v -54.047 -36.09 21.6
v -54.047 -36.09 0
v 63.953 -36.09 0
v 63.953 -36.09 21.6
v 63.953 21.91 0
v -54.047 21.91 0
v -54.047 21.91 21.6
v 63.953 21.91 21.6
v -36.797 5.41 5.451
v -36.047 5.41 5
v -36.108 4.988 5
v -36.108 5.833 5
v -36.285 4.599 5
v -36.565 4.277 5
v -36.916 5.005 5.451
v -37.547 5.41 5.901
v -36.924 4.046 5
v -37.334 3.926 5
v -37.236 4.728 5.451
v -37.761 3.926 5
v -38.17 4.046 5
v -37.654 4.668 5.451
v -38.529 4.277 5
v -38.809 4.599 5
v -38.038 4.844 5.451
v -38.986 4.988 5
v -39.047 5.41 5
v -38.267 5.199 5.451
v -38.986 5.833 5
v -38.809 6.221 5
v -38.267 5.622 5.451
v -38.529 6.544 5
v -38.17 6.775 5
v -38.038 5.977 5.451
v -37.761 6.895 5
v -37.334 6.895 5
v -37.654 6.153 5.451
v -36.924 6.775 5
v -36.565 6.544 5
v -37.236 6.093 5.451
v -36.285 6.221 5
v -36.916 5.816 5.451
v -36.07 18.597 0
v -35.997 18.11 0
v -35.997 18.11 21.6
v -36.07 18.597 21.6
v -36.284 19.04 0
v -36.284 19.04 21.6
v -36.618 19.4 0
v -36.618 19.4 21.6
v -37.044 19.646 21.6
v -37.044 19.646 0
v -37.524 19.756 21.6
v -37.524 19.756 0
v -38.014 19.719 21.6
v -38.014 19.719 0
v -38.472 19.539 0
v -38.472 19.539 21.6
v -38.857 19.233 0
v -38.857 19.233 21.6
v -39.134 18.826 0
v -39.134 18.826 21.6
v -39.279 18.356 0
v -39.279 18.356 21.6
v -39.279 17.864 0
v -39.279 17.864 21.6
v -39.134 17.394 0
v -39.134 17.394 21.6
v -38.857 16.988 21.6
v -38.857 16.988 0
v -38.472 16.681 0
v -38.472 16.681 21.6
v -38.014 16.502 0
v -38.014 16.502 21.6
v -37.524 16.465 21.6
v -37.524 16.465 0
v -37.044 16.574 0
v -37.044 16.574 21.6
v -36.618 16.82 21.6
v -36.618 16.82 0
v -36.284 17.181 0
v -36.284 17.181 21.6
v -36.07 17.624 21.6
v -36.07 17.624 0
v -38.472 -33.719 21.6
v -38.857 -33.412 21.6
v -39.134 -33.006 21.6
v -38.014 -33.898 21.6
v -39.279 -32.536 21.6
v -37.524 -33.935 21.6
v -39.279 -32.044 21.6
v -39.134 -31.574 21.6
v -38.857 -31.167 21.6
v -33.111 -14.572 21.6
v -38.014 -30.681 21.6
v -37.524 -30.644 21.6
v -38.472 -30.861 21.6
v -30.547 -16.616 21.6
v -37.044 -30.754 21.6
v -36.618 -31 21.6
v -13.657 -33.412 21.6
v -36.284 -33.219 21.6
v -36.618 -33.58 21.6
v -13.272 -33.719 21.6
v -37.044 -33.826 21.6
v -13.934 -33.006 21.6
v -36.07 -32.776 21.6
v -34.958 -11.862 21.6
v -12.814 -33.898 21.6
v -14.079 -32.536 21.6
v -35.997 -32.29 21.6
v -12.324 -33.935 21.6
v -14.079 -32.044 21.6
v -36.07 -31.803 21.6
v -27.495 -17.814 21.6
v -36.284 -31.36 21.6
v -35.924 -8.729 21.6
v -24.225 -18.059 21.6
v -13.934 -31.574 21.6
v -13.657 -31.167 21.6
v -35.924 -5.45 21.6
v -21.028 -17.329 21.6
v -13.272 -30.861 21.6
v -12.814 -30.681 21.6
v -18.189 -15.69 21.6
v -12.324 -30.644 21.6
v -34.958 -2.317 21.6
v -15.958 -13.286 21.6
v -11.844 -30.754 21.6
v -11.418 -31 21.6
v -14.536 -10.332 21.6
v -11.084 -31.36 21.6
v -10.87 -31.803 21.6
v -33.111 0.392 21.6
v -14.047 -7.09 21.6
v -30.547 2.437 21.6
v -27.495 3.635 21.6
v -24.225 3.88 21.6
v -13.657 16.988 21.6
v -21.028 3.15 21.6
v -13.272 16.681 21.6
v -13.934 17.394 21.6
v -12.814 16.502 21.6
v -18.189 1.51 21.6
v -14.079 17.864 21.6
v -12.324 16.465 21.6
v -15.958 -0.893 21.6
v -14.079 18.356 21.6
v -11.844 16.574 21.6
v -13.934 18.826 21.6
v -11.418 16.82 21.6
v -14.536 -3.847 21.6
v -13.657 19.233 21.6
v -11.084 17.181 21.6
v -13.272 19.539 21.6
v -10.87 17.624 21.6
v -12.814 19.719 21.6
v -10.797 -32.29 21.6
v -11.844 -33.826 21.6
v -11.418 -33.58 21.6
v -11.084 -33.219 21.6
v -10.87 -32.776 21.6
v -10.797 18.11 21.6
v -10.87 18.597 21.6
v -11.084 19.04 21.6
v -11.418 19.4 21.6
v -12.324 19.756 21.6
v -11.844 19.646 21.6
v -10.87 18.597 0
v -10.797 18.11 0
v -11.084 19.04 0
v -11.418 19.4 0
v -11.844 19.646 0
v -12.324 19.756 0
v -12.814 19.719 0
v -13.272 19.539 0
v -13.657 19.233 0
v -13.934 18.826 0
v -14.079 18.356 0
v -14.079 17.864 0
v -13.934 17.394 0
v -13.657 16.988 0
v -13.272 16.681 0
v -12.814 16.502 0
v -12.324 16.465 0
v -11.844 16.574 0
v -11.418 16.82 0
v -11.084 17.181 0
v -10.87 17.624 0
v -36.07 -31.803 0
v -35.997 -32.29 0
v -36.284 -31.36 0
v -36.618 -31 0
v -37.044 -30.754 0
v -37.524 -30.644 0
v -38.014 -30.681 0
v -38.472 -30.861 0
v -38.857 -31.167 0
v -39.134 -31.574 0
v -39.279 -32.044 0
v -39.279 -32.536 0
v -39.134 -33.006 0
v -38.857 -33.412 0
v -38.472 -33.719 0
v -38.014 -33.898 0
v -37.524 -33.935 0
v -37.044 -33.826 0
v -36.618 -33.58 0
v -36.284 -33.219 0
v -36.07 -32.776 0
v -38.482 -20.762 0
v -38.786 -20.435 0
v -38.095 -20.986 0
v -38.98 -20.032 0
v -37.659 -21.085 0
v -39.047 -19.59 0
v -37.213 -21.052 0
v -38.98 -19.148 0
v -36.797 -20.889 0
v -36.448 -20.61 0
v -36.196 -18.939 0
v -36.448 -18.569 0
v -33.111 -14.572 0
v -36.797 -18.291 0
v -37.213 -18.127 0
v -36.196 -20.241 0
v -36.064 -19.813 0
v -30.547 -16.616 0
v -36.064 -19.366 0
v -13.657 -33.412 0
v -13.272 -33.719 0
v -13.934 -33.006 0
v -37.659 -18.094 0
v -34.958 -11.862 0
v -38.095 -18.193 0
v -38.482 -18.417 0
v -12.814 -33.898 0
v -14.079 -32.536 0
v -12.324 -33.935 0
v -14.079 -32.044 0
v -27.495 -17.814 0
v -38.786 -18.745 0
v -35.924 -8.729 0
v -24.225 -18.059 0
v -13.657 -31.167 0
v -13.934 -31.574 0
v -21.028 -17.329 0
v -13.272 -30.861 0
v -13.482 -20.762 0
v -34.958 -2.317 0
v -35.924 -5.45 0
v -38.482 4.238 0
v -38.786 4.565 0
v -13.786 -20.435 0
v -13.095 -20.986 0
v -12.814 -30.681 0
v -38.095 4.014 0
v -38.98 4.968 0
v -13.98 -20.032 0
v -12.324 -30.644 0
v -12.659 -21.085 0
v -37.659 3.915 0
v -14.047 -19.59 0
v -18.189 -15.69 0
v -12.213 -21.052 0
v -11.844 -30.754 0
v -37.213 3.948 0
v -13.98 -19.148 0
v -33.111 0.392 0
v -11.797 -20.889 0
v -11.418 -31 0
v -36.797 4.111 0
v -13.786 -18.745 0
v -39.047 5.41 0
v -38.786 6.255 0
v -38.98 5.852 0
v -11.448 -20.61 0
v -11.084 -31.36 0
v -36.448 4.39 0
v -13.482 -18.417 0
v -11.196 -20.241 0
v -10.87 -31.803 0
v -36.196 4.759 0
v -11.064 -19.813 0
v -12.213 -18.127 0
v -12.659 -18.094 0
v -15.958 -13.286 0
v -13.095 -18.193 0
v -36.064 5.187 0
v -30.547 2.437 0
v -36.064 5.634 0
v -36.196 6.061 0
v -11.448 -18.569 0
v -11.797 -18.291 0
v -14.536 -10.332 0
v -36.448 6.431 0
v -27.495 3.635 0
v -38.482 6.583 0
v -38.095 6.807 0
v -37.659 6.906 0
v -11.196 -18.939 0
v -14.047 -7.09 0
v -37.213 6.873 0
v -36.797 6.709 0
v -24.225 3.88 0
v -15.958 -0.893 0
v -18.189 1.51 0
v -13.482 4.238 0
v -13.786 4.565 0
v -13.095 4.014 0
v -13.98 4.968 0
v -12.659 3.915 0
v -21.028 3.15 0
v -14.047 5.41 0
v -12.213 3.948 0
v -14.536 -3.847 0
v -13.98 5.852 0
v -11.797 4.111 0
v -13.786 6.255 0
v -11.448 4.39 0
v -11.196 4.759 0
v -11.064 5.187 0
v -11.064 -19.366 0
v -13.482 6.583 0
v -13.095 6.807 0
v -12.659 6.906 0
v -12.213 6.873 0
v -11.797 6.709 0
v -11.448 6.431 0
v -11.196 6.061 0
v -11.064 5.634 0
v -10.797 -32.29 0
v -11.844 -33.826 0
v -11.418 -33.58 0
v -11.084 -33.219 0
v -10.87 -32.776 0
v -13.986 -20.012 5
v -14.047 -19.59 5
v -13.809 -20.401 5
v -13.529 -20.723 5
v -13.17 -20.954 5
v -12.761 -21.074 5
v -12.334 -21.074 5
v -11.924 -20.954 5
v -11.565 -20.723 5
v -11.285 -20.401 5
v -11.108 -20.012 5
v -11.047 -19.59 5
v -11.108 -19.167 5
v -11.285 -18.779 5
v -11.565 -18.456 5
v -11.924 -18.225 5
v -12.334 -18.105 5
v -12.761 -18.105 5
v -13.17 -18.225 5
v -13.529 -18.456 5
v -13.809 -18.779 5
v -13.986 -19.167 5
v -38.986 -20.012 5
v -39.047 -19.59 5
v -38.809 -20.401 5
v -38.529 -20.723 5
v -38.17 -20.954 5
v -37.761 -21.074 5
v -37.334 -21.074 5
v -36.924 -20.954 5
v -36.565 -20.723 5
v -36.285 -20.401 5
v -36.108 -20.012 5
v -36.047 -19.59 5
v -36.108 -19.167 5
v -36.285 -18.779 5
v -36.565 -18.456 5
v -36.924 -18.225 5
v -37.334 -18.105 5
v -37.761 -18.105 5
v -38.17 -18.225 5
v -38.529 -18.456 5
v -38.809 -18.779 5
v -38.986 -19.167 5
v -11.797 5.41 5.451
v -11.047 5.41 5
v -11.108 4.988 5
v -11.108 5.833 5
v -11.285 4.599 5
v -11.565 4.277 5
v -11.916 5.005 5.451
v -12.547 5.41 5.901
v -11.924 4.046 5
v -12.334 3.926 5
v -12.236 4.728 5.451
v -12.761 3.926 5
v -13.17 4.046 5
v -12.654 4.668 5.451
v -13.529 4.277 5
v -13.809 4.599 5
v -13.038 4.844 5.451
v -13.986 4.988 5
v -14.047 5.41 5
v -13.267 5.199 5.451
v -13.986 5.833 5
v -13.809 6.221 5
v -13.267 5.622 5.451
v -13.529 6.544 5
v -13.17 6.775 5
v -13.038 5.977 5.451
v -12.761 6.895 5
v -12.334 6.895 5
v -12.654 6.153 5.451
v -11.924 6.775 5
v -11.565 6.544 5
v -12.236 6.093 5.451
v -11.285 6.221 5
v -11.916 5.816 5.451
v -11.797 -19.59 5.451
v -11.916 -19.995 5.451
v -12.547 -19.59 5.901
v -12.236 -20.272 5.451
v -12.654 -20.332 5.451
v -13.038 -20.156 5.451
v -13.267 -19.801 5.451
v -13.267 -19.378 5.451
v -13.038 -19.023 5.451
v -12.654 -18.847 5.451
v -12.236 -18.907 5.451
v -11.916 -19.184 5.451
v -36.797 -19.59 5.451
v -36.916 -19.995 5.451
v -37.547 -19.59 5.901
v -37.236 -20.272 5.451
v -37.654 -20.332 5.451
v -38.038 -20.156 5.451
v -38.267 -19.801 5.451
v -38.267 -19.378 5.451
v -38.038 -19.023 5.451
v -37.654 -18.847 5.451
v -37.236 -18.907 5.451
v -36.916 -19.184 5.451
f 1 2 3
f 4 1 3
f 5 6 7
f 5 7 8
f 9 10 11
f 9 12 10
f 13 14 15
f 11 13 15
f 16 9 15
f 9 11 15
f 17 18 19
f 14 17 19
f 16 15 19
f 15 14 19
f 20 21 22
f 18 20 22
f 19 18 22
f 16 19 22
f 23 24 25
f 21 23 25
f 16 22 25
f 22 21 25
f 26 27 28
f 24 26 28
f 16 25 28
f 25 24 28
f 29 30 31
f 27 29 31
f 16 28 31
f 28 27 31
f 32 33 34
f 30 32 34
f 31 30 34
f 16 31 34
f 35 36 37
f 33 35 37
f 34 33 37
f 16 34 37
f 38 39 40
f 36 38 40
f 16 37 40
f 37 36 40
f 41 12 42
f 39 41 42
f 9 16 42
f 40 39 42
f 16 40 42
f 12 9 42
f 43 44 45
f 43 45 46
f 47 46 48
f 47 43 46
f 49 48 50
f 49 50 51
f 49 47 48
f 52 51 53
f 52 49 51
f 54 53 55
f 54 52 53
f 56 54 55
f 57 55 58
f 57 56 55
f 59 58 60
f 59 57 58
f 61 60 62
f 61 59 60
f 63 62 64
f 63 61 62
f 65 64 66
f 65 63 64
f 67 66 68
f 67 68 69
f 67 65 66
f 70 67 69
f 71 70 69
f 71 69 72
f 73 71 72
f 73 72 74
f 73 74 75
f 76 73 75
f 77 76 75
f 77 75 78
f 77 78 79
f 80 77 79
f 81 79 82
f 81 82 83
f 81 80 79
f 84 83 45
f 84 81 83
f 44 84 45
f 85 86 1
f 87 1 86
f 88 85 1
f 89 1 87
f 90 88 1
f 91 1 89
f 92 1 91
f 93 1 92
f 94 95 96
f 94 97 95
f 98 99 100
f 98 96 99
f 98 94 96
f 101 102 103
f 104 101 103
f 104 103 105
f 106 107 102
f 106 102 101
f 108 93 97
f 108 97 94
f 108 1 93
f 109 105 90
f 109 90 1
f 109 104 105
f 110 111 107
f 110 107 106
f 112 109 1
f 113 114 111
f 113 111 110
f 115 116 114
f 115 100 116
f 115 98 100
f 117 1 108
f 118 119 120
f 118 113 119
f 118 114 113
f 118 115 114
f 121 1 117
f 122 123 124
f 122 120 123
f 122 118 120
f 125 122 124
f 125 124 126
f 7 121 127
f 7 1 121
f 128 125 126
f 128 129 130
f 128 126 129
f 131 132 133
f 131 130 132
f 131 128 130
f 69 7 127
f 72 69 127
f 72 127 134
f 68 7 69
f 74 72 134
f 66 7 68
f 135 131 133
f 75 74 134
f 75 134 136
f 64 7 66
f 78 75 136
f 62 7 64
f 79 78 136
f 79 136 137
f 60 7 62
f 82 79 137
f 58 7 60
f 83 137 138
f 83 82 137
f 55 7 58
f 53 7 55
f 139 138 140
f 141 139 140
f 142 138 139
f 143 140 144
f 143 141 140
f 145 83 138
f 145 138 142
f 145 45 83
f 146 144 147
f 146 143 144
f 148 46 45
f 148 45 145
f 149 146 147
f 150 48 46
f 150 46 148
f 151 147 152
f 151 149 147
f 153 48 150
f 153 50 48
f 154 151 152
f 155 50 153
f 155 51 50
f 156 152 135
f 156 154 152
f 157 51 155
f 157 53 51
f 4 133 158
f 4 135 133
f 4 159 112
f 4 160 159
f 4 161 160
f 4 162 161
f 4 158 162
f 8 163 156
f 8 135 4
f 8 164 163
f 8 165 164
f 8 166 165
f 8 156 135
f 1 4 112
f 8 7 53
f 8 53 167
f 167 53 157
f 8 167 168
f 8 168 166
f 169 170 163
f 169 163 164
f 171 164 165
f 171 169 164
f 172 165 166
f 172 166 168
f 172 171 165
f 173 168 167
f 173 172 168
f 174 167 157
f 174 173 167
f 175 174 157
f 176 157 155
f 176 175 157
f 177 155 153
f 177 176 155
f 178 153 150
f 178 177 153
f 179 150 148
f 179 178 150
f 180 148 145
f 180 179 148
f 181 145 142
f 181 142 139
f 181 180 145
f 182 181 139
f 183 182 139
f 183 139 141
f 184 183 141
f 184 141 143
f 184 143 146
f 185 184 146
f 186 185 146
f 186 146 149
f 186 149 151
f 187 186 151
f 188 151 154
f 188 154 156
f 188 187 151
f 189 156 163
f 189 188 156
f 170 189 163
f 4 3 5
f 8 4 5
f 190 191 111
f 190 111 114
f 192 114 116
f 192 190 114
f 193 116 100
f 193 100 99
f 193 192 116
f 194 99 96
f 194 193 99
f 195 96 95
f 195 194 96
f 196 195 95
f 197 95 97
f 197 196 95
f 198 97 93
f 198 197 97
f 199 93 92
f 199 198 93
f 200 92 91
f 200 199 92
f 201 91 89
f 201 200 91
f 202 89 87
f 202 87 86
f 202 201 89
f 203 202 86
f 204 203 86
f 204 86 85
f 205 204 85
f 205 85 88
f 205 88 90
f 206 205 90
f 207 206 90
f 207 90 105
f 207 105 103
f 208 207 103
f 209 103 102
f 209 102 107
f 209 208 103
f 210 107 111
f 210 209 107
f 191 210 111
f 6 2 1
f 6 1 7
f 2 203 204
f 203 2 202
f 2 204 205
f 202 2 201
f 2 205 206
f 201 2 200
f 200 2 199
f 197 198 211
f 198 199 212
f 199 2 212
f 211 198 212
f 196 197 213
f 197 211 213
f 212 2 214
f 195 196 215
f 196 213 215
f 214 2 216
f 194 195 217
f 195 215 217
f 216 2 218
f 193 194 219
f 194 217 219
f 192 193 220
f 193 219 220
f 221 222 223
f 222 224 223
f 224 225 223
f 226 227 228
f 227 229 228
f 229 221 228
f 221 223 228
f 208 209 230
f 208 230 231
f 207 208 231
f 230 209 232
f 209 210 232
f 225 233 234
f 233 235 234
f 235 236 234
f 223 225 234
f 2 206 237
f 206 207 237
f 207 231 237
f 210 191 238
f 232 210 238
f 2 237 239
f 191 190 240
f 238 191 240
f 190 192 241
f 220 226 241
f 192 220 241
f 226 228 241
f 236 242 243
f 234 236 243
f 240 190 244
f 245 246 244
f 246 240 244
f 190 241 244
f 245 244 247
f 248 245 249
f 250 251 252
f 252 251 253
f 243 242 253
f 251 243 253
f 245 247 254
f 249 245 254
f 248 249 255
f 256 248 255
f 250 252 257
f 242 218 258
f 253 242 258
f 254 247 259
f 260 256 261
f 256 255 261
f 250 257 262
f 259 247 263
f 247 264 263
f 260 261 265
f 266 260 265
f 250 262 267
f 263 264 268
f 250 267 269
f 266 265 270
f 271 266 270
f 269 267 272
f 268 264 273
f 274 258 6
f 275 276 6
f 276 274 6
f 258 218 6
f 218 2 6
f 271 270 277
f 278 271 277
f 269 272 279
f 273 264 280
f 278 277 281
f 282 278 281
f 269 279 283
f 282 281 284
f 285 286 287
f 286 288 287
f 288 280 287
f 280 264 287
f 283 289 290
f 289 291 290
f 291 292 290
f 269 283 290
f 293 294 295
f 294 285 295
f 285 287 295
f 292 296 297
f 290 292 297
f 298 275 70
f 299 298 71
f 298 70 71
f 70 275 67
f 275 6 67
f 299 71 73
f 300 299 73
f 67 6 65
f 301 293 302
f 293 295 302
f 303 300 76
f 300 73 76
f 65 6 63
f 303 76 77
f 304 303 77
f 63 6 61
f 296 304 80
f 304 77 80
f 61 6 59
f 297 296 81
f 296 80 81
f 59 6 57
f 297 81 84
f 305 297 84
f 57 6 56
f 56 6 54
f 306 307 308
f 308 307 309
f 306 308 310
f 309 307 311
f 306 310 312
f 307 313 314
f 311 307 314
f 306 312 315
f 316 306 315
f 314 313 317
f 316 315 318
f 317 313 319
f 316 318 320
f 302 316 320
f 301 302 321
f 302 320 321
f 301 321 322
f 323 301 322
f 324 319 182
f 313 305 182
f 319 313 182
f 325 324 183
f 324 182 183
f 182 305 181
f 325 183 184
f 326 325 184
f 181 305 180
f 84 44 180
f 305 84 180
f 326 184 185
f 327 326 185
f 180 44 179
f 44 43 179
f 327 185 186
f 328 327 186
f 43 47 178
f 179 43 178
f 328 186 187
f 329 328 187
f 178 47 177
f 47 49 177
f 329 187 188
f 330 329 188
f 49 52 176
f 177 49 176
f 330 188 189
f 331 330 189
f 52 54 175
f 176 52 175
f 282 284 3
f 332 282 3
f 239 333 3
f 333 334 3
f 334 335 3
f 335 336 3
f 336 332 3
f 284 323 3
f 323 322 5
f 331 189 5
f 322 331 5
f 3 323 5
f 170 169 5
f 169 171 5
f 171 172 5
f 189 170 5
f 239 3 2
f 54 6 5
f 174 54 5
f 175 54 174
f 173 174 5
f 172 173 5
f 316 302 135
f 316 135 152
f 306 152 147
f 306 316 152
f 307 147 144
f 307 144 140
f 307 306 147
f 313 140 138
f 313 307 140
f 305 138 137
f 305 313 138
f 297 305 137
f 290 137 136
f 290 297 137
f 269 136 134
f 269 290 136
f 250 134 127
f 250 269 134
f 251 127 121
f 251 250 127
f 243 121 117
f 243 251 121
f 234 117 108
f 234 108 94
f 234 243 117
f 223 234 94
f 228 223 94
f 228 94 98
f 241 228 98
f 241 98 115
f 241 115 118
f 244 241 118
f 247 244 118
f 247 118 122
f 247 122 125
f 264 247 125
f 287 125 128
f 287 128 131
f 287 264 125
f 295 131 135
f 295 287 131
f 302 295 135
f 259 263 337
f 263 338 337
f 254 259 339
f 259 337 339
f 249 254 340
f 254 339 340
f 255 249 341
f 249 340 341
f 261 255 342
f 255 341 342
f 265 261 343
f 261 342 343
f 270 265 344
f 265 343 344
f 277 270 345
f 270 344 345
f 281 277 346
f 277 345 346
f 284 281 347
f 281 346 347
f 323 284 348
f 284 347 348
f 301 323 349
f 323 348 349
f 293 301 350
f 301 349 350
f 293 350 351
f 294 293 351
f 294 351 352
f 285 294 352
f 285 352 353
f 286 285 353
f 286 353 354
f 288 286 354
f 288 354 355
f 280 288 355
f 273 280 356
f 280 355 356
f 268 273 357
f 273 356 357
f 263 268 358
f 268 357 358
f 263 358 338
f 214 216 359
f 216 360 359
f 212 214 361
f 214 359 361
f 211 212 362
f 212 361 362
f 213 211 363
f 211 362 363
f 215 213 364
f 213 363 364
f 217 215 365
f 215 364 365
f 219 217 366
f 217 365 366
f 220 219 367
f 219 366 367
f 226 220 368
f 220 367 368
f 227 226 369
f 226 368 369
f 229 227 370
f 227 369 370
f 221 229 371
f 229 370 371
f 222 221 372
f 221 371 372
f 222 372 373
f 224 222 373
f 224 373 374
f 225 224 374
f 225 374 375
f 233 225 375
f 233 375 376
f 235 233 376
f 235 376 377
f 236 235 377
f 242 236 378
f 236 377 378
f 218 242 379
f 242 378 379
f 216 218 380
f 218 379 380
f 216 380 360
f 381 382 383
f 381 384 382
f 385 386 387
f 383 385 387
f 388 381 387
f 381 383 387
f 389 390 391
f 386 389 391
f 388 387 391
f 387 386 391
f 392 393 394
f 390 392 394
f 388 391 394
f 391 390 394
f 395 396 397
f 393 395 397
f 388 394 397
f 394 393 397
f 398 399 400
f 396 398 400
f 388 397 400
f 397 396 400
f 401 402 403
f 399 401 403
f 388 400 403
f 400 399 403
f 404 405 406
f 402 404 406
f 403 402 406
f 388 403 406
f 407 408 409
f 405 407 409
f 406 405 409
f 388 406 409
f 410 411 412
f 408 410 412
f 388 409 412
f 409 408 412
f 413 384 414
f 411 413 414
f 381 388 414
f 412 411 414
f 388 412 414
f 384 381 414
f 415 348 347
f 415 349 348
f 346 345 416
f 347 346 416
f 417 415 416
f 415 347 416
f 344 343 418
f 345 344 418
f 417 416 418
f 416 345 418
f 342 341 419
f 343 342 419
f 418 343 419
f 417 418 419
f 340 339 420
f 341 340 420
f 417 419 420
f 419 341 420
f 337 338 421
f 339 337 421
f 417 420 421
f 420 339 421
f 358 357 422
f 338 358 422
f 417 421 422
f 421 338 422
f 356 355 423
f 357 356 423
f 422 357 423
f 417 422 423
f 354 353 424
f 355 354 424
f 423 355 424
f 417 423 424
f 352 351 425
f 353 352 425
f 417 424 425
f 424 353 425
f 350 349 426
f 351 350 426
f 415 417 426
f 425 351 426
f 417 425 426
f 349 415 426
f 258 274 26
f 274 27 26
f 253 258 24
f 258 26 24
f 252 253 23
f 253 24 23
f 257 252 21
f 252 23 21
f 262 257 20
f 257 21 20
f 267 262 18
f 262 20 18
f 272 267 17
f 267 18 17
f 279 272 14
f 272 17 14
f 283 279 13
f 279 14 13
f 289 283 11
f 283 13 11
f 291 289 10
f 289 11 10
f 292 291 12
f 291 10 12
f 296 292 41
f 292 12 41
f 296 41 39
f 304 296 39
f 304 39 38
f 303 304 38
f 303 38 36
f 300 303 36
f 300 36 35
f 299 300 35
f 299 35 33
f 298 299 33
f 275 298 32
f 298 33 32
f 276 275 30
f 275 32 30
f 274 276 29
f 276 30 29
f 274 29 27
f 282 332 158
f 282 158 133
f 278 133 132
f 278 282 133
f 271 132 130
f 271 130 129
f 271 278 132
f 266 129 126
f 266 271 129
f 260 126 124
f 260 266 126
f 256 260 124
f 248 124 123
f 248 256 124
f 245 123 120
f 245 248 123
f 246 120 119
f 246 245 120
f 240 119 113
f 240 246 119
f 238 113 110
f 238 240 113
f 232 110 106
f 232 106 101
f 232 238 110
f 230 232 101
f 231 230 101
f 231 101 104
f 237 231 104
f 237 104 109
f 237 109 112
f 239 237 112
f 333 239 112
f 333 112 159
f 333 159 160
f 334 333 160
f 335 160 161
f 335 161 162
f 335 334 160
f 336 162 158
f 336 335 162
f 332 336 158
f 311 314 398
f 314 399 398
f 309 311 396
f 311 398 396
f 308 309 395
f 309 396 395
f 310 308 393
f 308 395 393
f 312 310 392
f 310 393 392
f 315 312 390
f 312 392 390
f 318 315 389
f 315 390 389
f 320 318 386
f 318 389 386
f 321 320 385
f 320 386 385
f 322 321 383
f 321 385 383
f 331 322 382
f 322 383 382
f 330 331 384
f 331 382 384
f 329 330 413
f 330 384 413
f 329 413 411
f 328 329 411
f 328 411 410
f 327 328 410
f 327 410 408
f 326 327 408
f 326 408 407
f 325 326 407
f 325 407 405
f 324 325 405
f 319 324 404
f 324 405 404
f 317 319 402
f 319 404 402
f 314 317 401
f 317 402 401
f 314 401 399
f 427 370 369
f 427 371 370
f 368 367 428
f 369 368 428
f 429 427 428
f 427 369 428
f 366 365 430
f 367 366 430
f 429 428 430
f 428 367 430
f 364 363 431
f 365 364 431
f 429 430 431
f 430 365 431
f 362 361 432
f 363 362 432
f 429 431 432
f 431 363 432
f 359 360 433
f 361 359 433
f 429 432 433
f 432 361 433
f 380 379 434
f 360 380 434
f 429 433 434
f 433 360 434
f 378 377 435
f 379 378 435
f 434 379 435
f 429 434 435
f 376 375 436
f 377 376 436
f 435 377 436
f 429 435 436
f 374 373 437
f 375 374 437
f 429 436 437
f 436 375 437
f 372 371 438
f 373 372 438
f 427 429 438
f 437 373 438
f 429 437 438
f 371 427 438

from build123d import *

# Parameters (mm, degrees)
F0_W     = 118
F0_H     = 58
F0_R     = 1.65
F0_R_2   = 11
F1_DEPTH = 21.6
F2_D     = 3
F2_DEPTH = 5
F2_TIP   = 0.9012909285


with BuildPart() as f1:
    # F0 (on Top) → F1 (new body)
    with BuildSketch(Plane.XY):
        with Locations((4.9529026613, -7.0896845311)):
            Rectangle(F0_W, F0_H)
        with Locations((-37.6470973387, -32.2896845311)):
            Circle(F0_R, mode=Mode.SUBTRACT)
        with Locations((-12.4470973387, -32.2896845311)):
            Circle(F0_R, mode=Mode.SUBTRACT)
        with Locations((-25.0470973387, -7.0896845311)):
            Circle(F0_R_2, mode=Mode.SUBTRACT)
        with Locations((-37.6470973387, 18.1103154689)):
            Circle(F0_R, mode=Mode.SUBTRACT)
        with Locations((-12.4470973387, 18.1103154689)):
            Circle(F0_R, mode=Mode.SUBTRACT)
    extrude(amount=F1_DEPTH)

    # F2
    with Locations(Plane(origin=(0, 0, 0), x_dir=(1, 0, 0), z_dir=(0, 0, -1))):
        with Locations((-37.5470973387, 19.5896845311), (-12.5470973387, 19.5896845311), (-12.5470973387, -5.4103154689), (-37.5470973387, -5.4103154689)):
            Hole(F2_D / 2, depth=F2_DEPTH)
            with Locations((0, 0, -(F2_DEPTH + F2_TIP / 2))):  # 118° drill point
                Cone(0, F2_D / 2, F2_TIP, mode=Mode.SUBTRACT)


solid = f1.part
